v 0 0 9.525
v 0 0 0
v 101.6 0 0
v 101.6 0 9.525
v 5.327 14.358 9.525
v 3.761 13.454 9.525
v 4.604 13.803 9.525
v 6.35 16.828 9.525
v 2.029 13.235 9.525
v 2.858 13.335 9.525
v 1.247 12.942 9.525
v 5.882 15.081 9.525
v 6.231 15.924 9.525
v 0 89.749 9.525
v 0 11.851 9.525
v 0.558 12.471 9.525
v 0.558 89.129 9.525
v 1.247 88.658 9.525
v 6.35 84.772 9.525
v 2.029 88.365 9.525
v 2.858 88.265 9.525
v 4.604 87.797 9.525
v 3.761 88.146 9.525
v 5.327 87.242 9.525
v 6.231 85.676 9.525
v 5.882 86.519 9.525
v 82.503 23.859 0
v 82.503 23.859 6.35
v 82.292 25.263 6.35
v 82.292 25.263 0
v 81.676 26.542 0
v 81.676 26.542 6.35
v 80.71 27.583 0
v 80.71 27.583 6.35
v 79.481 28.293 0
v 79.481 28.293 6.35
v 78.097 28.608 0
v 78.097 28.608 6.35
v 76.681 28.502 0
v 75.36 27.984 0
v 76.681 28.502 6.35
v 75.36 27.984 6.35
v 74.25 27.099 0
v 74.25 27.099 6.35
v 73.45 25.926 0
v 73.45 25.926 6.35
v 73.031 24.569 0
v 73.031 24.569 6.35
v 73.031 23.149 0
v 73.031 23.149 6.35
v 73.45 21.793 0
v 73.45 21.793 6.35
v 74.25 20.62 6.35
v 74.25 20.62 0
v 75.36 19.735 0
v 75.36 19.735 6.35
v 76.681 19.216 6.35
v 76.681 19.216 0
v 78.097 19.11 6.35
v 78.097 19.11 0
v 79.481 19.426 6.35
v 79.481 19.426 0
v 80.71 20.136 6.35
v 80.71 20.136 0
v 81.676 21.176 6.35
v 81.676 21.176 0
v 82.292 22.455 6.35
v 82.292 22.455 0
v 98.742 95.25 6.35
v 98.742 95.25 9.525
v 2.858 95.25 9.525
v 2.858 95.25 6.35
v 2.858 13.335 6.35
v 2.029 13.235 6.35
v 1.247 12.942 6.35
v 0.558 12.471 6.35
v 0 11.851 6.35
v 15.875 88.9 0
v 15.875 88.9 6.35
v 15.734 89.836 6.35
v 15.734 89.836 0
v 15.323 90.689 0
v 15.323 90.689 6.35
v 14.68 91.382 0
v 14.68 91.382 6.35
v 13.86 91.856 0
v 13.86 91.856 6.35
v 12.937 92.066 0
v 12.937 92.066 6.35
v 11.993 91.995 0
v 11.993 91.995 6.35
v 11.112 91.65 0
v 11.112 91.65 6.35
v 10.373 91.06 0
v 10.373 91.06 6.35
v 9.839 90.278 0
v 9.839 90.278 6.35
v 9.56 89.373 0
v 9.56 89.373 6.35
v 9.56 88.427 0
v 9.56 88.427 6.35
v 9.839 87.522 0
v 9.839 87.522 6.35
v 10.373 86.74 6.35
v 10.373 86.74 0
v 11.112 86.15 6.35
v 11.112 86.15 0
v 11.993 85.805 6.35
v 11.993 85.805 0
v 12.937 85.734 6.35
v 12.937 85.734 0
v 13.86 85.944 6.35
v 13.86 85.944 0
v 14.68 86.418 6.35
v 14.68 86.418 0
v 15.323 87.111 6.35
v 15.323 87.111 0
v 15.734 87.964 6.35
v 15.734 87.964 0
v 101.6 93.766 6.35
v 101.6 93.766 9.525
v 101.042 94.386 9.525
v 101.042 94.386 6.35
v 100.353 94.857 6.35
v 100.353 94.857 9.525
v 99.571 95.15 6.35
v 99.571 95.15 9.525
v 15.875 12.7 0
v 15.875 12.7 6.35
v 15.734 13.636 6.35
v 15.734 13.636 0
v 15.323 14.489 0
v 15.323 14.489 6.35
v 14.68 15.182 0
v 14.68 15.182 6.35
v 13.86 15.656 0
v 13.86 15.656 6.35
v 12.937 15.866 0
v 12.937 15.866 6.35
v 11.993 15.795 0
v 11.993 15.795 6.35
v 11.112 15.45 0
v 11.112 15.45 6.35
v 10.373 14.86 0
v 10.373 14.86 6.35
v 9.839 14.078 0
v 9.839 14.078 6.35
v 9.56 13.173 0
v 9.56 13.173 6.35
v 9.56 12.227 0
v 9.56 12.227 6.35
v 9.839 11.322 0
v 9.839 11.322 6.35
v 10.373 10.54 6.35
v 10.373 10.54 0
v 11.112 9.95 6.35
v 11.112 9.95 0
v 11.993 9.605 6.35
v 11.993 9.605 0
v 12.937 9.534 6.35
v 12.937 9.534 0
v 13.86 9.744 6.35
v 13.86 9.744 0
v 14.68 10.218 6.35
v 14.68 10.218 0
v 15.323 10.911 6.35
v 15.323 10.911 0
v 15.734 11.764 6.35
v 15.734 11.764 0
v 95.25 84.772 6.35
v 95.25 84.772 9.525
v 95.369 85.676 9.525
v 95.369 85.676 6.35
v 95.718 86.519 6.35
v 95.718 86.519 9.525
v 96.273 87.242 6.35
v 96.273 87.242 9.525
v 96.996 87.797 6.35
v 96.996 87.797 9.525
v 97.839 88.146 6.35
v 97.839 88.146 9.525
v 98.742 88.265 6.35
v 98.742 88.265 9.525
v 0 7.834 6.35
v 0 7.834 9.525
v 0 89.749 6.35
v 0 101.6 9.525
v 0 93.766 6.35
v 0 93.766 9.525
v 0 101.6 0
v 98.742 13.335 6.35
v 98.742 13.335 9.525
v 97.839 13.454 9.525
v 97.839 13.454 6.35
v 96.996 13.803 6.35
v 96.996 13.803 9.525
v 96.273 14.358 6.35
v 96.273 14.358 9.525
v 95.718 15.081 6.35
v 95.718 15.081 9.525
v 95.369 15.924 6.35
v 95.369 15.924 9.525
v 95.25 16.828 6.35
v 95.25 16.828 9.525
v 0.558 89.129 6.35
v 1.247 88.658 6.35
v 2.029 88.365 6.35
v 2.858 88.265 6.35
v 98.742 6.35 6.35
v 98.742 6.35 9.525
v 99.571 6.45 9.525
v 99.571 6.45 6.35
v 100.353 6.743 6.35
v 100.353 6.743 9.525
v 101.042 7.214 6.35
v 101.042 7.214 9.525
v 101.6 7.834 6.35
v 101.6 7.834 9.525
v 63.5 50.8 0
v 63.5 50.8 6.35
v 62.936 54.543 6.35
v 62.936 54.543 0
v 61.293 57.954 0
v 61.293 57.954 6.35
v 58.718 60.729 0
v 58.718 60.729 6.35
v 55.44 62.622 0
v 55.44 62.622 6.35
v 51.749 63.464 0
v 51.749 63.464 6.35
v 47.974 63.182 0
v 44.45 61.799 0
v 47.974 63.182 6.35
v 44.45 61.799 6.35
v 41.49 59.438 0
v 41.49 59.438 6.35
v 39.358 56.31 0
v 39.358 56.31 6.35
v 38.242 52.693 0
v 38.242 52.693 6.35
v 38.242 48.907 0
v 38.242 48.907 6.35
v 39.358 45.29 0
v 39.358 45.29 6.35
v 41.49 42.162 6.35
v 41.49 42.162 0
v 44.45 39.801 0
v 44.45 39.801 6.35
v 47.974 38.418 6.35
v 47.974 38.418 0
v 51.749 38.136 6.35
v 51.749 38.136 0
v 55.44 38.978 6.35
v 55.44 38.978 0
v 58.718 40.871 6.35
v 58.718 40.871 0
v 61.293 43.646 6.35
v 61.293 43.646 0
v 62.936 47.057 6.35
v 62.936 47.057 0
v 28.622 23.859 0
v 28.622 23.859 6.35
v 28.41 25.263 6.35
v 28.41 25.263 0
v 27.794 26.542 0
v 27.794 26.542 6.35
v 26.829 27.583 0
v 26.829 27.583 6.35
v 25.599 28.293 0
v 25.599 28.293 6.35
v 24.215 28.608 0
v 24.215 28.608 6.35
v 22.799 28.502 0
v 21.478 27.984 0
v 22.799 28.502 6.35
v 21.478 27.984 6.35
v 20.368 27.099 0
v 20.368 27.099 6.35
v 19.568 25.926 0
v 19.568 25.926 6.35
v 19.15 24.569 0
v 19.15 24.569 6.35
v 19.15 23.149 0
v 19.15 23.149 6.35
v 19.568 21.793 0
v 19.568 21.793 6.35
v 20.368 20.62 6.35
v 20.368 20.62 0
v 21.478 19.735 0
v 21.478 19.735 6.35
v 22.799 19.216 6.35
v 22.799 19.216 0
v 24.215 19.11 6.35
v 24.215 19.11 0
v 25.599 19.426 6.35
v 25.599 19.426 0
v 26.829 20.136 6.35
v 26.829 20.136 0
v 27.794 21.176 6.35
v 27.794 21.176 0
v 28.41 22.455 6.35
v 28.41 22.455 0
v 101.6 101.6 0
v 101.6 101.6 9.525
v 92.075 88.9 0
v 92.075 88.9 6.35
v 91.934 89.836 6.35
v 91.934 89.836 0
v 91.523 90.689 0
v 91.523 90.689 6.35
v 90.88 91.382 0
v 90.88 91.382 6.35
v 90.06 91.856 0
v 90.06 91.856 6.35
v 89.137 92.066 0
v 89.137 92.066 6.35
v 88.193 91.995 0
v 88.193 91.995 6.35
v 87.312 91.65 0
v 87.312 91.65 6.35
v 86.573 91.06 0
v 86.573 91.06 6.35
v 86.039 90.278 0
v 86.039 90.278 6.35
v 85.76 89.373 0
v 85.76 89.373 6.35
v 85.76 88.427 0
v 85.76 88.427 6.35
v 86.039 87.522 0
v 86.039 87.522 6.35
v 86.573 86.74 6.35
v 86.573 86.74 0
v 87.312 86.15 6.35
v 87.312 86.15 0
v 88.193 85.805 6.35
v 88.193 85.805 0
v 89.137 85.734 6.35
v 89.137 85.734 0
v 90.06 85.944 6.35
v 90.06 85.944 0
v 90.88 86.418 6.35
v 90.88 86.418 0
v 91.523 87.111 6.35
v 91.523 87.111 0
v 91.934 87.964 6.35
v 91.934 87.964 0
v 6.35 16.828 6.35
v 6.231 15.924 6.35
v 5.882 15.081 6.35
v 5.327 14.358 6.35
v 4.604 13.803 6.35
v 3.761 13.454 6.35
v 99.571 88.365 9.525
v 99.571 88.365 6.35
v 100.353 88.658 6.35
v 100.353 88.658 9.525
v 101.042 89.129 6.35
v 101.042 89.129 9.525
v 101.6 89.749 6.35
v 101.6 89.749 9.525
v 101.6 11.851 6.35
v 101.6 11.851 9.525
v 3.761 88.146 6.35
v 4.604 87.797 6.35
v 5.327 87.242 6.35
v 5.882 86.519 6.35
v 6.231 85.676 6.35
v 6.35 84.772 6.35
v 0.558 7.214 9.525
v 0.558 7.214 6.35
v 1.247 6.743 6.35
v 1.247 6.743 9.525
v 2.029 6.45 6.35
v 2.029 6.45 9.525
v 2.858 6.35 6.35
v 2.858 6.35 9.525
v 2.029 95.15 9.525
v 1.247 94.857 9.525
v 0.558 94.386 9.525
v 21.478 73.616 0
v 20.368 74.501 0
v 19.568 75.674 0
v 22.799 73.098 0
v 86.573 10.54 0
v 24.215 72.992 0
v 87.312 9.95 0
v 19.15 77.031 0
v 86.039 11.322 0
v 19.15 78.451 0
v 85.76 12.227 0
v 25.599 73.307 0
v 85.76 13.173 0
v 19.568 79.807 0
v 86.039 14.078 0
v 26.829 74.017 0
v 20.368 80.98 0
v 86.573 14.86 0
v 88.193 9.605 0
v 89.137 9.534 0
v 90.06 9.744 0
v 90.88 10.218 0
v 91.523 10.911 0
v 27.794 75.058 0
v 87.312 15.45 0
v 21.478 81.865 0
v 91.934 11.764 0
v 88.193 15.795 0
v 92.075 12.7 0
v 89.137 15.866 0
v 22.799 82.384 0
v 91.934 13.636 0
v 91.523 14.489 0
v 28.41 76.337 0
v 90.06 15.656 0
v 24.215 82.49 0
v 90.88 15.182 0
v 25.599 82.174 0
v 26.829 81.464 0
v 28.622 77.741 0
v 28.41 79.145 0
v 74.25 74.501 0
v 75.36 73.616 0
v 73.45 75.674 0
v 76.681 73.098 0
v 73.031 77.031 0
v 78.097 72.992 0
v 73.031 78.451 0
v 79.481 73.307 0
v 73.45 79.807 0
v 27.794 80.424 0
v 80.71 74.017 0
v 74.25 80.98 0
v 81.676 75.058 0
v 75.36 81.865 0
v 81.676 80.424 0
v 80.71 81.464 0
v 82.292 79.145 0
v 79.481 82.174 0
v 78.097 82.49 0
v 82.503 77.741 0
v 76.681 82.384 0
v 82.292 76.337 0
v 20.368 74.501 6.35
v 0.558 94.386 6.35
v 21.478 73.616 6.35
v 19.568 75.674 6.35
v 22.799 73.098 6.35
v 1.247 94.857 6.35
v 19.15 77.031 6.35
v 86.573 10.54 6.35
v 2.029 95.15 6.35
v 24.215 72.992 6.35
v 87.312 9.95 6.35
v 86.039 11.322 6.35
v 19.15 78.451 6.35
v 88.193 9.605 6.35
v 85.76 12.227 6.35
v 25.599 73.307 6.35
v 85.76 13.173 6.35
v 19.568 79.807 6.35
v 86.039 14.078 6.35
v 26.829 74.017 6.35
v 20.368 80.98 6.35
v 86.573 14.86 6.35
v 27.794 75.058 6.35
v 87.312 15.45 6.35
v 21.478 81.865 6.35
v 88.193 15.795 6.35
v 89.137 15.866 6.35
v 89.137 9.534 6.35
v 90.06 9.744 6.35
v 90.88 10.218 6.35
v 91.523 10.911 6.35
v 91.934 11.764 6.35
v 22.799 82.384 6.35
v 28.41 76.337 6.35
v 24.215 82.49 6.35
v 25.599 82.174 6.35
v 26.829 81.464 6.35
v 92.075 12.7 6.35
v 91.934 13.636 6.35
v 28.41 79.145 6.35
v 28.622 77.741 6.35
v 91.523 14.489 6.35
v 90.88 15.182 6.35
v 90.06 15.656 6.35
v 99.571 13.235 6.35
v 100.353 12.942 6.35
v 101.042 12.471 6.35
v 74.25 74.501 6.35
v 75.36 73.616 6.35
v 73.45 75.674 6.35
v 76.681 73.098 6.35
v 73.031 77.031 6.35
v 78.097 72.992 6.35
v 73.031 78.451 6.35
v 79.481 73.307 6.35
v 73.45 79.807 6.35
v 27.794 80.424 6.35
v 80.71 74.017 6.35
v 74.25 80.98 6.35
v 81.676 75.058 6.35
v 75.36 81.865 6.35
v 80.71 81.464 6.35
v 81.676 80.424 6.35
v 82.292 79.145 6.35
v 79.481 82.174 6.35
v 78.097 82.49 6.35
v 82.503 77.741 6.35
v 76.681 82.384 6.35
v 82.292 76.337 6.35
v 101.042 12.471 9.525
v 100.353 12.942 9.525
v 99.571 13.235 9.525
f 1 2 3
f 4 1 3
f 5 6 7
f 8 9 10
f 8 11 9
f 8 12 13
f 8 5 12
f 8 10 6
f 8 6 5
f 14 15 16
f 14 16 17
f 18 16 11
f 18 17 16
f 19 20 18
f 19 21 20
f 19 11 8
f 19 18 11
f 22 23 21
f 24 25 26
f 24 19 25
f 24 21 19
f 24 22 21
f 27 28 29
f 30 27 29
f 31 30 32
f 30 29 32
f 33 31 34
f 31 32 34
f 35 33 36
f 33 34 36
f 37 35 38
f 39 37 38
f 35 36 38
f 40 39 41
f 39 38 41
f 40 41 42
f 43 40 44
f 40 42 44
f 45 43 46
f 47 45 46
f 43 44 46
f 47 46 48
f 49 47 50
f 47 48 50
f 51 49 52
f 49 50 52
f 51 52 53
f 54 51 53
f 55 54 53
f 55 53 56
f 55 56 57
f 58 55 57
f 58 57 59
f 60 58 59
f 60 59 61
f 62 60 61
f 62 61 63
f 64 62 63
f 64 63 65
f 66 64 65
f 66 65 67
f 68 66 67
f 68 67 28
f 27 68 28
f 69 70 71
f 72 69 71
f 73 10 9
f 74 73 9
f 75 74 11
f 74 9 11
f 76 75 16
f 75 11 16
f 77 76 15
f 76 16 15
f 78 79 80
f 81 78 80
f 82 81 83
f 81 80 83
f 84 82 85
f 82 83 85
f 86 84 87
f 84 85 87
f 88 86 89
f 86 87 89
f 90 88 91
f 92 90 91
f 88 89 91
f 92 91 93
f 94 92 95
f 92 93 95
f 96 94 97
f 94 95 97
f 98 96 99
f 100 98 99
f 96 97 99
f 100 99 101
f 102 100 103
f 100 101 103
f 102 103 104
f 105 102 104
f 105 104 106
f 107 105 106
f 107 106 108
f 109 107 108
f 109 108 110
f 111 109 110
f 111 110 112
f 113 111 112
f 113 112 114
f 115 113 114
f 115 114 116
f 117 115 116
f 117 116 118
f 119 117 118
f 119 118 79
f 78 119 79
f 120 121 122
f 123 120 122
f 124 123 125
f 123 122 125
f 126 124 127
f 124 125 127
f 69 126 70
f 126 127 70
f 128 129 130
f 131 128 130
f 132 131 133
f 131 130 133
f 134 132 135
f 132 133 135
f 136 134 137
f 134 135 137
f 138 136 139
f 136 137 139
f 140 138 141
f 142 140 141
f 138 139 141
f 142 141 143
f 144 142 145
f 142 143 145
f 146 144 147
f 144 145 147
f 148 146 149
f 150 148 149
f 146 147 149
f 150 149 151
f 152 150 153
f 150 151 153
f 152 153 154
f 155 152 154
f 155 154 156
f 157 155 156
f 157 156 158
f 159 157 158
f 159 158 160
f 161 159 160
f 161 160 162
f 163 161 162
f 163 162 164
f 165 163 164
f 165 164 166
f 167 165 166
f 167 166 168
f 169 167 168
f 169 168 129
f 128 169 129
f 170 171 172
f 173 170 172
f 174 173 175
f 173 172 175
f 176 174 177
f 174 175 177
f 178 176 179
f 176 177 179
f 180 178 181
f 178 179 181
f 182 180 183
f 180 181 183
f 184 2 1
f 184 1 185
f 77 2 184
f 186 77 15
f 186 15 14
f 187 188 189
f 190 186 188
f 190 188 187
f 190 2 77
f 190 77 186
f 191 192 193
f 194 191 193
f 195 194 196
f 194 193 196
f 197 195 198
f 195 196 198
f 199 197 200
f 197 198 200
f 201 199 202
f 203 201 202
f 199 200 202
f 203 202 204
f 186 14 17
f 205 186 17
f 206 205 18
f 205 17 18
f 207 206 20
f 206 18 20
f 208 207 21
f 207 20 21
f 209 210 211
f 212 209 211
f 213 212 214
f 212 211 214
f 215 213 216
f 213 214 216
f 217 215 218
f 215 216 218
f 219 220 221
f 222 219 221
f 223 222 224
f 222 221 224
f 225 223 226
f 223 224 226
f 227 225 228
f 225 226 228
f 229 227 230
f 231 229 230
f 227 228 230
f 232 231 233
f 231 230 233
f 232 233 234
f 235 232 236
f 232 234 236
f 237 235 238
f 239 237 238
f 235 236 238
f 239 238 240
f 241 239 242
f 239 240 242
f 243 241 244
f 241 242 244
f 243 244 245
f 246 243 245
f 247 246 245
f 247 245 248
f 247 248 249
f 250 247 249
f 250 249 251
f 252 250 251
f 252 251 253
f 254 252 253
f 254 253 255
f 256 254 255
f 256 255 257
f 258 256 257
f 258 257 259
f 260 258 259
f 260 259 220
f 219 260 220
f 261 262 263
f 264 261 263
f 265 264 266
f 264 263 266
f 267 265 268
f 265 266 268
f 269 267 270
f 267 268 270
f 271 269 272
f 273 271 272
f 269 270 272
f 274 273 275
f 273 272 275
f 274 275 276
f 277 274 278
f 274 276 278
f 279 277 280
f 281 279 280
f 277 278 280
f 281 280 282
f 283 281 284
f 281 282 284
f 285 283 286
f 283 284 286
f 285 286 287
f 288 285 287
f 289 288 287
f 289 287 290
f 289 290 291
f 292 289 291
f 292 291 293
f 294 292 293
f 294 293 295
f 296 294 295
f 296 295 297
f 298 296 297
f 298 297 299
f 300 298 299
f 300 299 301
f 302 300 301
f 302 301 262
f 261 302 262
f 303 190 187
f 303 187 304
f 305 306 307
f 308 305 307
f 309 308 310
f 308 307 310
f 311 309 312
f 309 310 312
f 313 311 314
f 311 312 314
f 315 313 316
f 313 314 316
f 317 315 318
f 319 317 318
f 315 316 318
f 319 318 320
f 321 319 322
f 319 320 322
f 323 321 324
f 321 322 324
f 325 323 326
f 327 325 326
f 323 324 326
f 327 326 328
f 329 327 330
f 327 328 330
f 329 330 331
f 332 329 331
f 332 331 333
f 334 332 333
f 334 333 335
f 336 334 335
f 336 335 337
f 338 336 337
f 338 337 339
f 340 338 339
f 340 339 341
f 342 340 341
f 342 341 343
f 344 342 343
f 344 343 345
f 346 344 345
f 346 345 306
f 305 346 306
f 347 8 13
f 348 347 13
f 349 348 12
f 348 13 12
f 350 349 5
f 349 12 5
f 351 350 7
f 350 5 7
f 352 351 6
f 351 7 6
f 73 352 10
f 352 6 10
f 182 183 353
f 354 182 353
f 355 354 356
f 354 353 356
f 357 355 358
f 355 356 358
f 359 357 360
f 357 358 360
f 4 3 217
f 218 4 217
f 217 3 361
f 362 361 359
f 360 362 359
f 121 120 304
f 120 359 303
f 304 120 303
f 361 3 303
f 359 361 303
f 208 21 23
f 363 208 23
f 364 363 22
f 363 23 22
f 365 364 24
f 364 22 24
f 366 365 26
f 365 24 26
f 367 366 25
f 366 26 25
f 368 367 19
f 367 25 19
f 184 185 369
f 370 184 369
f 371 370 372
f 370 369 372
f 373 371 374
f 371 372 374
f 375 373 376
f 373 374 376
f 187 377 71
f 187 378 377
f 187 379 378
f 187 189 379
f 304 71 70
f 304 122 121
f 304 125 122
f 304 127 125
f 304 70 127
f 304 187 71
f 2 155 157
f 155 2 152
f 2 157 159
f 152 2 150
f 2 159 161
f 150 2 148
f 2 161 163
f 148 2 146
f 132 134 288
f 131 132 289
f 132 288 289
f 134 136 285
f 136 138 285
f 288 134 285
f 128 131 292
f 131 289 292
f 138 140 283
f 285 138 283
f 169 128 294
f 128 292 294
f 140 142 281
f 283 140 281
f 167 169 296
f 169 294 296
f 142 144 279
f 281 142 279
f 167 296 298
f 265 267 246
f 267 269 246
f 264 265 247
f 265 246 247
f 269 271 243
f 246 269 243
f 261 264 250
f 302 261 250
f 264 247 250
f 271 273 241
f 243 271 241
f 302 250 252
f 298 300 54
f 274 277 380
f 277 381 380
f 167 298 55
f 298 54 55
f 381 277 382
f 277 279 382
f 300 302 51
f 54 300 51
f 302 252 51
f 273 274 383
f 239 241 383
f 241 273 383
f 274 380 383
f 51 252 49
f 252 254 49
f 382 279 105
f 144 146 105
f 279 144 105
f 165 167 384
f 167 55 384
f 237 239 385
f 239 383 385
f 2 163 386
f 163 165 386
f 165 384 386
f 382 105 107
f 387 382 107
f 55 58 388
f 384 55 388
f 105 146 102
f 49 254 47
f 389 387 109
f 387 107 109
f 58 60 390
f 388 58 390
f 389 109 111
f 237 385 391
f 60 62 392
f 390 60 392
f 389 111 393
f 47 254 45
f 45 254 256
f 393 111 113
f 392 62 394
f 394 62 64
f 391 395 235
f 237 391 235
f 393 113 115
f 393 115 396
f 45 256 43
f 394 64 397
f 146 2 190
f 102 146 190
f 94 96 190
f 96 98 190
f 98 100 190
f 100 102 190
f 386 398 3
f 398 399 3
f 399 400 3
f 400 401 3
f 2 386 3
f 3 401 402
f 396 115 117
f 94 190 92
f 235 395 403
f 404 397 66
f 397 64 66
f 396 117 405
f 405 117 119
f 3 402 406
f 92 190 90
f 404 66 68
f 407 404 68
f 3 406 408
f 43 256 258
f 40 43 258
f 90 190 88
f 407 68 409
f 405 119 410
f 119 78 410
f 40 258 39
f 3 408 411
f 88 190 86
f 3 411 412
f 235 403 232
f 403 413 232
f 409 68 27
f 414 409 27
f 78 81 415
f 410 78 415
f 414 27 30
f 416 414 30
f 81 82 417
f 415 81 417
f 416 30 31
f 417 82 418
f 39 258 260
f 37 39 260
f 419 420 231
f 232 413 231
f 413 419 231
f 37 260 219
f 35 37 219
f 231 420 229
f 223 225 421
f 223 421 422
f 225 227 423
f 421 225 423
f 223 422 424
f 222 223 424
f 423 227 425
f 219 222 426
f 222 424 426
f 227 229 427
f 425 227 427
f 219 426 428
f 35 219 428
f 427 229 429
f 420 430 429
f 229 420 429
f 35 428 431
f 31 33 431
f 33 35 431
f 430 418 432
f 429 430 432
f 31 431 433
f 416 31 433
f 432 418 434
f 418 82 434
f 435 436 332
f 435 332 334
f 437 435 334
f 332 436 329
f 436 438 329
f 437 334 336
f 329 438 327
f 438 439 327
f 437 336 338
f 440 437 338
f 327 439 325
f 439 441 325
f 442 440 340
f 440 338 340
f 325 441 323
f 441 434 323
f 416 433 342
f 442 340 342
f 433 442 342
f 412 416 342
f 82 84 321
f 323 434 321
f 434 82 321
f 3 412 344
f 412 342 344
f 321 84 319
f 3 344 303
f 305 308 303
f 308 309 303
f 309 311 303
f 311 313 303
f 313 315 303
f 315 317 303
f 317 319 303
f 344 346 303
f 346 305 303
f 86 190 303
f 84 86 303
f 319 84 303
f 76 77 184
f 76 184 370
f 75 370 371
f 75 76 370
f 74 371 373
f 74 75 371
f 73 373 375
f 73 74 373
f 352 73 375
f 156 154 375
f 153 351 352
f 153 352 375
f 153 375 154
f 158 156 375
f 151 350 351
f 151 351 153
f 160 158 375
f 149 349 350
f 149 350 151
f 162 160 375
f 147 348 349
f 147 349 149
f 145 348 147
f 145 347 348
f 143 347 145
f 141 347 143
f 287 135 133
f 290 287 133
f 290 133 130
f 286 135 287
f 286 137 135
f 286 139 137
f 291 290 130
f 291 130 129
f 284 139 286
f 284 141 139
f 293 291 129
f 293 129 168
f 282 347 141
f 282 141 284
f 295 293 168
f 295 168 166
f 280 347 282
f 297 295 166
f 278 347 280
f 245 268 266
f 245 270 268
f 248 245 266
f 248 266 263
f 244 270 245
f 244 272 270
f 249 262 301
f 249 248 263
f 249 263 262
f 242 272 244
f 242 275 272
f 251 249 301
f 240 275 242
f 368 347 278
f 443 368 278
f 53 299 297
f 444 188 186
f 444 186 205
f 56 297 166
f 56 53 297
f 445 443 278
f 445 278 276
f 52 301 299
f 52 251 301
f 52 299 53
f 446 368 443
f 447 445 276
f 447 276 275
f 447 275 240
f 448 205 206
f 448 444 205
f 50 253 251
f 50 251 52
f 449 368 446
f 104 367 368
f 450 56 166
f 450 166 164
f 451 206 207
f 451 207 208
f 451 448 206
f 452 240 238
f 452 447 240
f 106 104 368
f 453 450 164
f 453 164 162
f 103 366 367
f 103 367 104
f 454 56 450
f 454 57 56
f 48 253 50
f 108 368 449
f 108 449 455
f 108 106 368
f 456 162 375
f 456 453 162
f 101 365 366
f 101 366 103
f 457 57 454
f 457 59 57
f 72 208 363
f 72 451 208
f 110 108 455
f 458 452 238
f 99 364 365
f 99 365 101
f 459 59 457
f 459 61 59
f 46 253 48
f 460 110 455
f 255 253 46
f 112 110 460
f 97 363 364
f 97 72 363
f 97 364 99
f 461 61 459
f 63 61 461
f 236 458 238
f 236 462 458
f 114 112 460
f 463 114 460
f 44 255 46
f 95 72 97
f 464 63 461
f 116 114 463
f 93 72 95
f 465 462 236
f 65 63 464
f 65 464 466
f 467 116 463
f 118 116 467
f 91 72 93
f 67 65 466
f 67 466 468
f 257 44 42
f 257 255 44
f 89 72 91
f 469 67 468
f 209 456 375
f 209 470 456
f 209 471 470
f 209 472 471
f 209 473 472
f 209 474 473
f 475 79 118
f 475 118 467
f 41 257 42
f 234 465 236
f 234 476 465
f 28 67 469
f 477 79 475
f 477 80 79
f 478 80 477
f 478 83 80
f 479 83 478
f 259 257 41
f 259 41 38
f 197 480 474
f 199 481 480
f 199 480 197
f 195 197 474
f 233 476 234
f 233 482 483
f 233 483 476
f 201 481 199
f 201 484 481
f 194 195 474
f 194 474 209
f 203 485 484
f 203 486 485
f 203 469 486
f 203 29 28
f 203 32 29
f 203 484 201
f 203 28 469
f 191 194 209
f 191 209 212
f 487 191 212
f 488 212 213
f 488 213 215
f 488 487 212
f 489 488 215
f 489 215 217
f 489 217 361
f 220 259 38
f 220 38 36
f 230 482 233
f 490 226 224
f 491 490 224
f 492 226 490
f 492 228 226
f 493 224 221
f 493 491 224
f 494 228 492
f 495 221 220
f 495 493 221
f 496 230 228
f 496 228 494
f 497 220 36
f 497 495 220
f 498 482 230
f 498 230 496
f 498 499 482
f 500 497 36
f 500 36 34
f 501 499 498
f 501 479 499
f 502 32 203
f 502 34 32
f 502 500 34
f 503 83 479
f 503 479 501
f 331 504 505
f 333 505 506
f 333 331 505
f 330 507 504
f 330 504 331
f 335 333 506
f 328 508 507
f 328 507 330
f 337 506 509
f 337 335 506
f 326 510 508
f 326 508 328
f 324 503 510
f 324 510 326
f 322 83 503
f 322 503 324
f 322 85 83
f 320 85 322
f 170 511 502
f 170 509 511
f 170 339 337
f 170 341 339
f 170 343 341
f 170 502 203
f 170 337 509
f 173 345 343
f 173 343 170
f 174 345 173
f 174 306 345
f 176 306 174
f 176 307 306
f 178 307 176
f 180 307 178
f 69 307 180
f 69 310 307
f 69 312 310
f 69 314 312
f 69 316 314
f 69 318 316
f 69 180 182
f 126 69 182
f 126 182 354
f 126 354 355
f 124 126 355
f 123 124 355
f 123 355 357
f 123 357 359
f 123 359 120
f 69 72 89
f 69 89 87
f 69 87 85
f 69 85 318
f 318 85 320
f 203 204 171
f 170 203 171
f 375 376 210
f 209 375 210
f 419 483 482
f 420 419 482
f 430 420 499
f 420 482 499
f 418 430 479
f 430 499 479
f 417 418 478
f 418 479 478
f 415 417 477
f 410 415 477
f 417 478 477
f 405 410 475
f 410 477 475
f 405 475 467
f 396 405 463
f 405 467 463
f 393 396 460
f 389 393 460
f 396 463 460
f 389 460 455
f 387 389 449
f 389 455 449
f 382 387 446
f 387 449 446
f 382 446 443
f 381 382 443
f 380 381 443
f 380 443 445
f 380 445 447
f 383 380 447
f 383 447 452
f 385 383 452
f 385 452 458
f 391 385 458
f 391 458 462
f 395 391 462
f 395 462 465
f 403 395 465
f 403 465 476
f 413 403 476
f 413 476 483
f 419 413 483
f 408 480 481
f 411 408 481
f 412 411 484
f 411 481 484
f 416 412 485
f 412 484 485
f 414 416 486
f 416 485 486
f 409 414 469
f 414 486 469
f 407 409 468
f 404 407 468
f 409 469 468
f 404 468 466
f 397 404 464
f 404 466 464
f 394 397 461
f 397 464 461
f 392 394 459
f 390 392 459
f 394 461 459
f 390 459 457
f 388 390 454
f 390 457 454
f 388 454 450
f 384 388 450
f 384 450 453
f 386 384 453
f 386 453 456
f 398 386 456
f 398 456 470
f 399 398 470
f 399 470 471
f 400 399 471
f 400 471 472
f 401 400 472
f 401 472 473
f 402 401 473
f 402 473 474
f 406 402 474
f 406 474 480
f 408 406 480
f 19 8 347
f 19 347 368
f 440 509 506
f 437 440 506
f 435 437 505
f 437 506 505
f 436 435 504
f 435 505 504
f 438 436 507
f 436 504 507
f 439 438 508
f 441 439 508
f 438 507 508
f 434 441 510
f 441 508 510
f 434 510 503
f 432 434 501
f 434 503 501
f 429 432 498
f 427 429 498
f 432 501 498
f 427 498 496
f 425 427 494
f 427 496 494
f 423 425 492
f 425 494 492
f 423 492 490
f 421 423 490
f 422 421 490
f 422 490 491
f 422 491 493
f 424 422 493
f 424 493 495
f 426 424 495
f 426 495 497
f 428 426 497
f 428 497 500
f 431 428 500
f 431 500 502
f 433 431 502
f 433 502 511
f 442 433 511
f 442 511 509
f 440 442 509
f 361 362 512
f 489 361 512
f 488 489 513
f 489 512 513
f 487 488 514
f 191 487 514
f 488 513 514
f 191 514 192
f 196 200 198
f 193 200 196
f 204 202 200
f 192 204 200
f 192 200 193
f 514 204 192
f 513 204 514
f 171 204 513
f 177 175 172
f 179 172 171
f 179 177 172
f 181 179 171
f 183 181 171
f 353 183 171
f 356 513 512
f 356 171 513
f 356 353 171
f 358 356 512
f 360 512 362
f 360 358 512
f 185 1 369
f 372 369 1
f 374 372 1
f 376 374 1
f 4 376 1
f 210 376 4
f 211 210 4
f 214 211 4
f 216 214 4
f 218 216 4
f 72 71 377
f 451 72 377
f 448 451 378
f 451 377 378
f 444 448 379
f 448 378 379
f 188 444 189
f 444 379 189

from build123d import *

# Parameters (mm, degrees)
F0_W     = 101.6
F0_H     = 101.6
F1_DEPTH = 9.525
F2_W     = 88.9
F2_H     = 88.9
F3_DEPTH = 3.175
F5_DEPTH = 3.175
F6_R     = 4.7625
F6_R_2   = 12.7
F7_DEPTH = 6.351
F8_R     = 3.175
F9_DEPTH = 9.526


with BuildPart() as f1:
    # F0 (on Top) → F1 (new body)
    with BuildSketch(Plane.XY):
        with Locations((50.8, 50.8)):
            Rectangle(F0_W, F0_H)
    extrude(amount=F1_DEPTH)

    # F2 (on face) → F3 (cut)
    with BuildSketch(Plane.XY.offset(9.525)):
        with Locations((50.8, 50.8)):
            Rectangle(F2_W, F2_H)
    extrude(amount=-F3_DEPTH, mode=Mode.SUBTRACT)

    # F4 (on face) → F5 (cut)
    with BuildSketch(Plane.XY.offset(9.525)):
        with BuildLine():
            Line((6.35, 95.25), (2.8575, 95.25))
            ThreePointArc((2.8575, 95.25), (1.2474604822, 94.8567465215), (0, 93.7655463142))
            Line((0, 93.7655463142), (0, 89.7494536858))
            ThreePointArc((0, 89.7494536858), (1.2474604822, 88.6582534785), (2.8575, 88.265))
            ThreePointArc((2.8575, 88.265), (5.3270704333, 87.2420704333), (6.35, 84.7725))
            Line((6.35, 84.7725), (6.35, 95.25))
        make_face()
        with BuildLine():
            ThreePointArc((2.8575, 13.335), (1.2474604822, 12.9417465215), (0, 11.8505463142))
            Line((0, 11.8505463142), (0, 7.8344536858))
            ThreePointArc((0, 7.8344536858), (1.2474604822, 6.7432534785), (2.8575, 6.35))
            Line((2.8575, 6.35), (6.35, 6.35))
            Line((6.35, 6.35), (6.35, 16.8275))
            ThreePointArc((6.35, 16.8275), (5.3270704333, 14.3579295667), (2.8575, 13.335))
        make_face()
        with BuildLine():
            ThreePointArc((98.7425, 13.335), (96.2729295667, 14.3579295667), (95.25, 16.8275))
            Line((95.25, 16.8275), (95.25, 6.35))
            Line((95.25, 6.35), (98.7425, 6.35))
            ThreePointArc((98.7425, 6.35), (100.3525395178, 6.7432534785), (101.6, 7.8344536858))
            Line((101.6, 7.8344536858), (101.6, 11.8505463142))
            ThreePointArc((101.6, 11.8505463142), (100.3525395178, 12.9417465215), (98.7425, 13.335))
        make_face()
        with BuildLine():
            Line((98.7425, 95.25), (95.25, 95.25))
            Line((95.25, 95.25), (95.25, 84.7725))
            ThreePointArc((95.25, 84.7725), (96.2729295667, 87.2420704333), (98.7425, 88.265))
            ThreePointArc((98.7425, 88.265), (100.3525395178, 88.6582534785), (101.6, 89.7494536858))
            Line((101.6, 89.7494536858), (101.6, 93.7655463142))
            ThreePointArc((101.6, 93.7655463142), (100.3525395178, 94.8567465215), (98.7425, 95.25))
        make_face()
    extrude(amount=-F5_DEPTH, mode=Mode.SUBTRACT)

    # F6 (on face) → F7 (cut, through all)
    with BuildSketch(Plane.XY.offset(6.35)):
        with Locations((23.8592316368, 77.7407683632)):
            Circle(F6_R)
        with Locations((77.7407683632, 77.7407683632)):
            Circle(F6_R)
        with Locations((77.7407683632, 23.8592316368)):
            Circle(F6_R)
        with Locations((23.8592316368, 23.8592316368)):
            Circle(F6_R)
        with Locations((50.8, 50.8)):
            Circle(F6_R_2)
    extrude(amount=-F7_DEPTH, mode=Mode.SUBTRACT)

    # F8 (on face) → F9 (cut, through all)
    with BuildSketch(Plane.XY.offset(9.525)):
        with Locations((12.7, 12.7)):
            Circle(F8_R)
        with Locations((88.9, 88.9)):
            Circle(F8_R)
        with Locations((12.7, 88.9)):
            Circle(F8_R)
        with Locations((88.9, 12.7)):
            Circle(F8_R)
    extrude(amount=-F9_DEPTH, mode=Mode.SUBTRACT)


solid = f1.part
